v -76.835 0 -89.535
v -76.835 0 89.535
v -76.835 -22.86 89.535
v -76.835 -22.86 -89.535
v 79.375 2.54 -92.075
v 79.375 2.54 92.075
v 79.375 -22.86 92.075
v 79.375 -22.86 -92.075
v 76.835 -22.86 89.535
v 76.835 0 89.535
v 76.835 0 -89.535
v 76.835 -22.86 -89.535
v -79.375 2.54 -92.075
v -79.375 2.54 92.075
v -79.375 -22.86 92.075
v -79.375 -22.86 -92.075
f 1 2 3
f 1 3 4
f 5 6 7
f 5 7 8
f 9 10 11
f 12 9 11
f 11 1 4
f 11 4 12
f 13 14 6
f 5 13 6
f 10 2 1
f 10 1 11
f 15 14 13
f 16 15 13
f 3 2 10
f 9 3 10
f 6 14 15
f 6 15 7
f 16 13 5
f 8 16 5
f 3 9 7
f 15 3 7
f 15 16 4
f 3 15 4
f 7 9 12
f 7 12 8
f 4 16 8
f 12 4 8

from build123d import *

# Parameters (mm, degrees)
SKETCH1_W           = 158.75
SKETCH1_H           = 184.15
BOSS_EXTRUDE1_DEPTH = 25.4
SHELL1_T            = -2.54


with BuildPart() as part:
    # Sketch1 → Boss-Extrude1 (new body)
    with BuildSketch(Plane(origin=(0, 2.54, 0), x_dir=(1, 0, 0), z_dir=(0, 1, 0))):
        Rectangle(SKETCH1_W, SKETCH1_H)
    extrude(amount=-BOSS_EXTRUDE1_DEPTH)

    # Shell1
    shell1_openings = [part.faces().sort_by_distance(p)[0] for p in [
        (0, -22.86, 0),
    ]]
    offset(amount=SHELL1_T, openings=shell1_openings, kind=Kind.INTERSECTION)


solid = part.part
